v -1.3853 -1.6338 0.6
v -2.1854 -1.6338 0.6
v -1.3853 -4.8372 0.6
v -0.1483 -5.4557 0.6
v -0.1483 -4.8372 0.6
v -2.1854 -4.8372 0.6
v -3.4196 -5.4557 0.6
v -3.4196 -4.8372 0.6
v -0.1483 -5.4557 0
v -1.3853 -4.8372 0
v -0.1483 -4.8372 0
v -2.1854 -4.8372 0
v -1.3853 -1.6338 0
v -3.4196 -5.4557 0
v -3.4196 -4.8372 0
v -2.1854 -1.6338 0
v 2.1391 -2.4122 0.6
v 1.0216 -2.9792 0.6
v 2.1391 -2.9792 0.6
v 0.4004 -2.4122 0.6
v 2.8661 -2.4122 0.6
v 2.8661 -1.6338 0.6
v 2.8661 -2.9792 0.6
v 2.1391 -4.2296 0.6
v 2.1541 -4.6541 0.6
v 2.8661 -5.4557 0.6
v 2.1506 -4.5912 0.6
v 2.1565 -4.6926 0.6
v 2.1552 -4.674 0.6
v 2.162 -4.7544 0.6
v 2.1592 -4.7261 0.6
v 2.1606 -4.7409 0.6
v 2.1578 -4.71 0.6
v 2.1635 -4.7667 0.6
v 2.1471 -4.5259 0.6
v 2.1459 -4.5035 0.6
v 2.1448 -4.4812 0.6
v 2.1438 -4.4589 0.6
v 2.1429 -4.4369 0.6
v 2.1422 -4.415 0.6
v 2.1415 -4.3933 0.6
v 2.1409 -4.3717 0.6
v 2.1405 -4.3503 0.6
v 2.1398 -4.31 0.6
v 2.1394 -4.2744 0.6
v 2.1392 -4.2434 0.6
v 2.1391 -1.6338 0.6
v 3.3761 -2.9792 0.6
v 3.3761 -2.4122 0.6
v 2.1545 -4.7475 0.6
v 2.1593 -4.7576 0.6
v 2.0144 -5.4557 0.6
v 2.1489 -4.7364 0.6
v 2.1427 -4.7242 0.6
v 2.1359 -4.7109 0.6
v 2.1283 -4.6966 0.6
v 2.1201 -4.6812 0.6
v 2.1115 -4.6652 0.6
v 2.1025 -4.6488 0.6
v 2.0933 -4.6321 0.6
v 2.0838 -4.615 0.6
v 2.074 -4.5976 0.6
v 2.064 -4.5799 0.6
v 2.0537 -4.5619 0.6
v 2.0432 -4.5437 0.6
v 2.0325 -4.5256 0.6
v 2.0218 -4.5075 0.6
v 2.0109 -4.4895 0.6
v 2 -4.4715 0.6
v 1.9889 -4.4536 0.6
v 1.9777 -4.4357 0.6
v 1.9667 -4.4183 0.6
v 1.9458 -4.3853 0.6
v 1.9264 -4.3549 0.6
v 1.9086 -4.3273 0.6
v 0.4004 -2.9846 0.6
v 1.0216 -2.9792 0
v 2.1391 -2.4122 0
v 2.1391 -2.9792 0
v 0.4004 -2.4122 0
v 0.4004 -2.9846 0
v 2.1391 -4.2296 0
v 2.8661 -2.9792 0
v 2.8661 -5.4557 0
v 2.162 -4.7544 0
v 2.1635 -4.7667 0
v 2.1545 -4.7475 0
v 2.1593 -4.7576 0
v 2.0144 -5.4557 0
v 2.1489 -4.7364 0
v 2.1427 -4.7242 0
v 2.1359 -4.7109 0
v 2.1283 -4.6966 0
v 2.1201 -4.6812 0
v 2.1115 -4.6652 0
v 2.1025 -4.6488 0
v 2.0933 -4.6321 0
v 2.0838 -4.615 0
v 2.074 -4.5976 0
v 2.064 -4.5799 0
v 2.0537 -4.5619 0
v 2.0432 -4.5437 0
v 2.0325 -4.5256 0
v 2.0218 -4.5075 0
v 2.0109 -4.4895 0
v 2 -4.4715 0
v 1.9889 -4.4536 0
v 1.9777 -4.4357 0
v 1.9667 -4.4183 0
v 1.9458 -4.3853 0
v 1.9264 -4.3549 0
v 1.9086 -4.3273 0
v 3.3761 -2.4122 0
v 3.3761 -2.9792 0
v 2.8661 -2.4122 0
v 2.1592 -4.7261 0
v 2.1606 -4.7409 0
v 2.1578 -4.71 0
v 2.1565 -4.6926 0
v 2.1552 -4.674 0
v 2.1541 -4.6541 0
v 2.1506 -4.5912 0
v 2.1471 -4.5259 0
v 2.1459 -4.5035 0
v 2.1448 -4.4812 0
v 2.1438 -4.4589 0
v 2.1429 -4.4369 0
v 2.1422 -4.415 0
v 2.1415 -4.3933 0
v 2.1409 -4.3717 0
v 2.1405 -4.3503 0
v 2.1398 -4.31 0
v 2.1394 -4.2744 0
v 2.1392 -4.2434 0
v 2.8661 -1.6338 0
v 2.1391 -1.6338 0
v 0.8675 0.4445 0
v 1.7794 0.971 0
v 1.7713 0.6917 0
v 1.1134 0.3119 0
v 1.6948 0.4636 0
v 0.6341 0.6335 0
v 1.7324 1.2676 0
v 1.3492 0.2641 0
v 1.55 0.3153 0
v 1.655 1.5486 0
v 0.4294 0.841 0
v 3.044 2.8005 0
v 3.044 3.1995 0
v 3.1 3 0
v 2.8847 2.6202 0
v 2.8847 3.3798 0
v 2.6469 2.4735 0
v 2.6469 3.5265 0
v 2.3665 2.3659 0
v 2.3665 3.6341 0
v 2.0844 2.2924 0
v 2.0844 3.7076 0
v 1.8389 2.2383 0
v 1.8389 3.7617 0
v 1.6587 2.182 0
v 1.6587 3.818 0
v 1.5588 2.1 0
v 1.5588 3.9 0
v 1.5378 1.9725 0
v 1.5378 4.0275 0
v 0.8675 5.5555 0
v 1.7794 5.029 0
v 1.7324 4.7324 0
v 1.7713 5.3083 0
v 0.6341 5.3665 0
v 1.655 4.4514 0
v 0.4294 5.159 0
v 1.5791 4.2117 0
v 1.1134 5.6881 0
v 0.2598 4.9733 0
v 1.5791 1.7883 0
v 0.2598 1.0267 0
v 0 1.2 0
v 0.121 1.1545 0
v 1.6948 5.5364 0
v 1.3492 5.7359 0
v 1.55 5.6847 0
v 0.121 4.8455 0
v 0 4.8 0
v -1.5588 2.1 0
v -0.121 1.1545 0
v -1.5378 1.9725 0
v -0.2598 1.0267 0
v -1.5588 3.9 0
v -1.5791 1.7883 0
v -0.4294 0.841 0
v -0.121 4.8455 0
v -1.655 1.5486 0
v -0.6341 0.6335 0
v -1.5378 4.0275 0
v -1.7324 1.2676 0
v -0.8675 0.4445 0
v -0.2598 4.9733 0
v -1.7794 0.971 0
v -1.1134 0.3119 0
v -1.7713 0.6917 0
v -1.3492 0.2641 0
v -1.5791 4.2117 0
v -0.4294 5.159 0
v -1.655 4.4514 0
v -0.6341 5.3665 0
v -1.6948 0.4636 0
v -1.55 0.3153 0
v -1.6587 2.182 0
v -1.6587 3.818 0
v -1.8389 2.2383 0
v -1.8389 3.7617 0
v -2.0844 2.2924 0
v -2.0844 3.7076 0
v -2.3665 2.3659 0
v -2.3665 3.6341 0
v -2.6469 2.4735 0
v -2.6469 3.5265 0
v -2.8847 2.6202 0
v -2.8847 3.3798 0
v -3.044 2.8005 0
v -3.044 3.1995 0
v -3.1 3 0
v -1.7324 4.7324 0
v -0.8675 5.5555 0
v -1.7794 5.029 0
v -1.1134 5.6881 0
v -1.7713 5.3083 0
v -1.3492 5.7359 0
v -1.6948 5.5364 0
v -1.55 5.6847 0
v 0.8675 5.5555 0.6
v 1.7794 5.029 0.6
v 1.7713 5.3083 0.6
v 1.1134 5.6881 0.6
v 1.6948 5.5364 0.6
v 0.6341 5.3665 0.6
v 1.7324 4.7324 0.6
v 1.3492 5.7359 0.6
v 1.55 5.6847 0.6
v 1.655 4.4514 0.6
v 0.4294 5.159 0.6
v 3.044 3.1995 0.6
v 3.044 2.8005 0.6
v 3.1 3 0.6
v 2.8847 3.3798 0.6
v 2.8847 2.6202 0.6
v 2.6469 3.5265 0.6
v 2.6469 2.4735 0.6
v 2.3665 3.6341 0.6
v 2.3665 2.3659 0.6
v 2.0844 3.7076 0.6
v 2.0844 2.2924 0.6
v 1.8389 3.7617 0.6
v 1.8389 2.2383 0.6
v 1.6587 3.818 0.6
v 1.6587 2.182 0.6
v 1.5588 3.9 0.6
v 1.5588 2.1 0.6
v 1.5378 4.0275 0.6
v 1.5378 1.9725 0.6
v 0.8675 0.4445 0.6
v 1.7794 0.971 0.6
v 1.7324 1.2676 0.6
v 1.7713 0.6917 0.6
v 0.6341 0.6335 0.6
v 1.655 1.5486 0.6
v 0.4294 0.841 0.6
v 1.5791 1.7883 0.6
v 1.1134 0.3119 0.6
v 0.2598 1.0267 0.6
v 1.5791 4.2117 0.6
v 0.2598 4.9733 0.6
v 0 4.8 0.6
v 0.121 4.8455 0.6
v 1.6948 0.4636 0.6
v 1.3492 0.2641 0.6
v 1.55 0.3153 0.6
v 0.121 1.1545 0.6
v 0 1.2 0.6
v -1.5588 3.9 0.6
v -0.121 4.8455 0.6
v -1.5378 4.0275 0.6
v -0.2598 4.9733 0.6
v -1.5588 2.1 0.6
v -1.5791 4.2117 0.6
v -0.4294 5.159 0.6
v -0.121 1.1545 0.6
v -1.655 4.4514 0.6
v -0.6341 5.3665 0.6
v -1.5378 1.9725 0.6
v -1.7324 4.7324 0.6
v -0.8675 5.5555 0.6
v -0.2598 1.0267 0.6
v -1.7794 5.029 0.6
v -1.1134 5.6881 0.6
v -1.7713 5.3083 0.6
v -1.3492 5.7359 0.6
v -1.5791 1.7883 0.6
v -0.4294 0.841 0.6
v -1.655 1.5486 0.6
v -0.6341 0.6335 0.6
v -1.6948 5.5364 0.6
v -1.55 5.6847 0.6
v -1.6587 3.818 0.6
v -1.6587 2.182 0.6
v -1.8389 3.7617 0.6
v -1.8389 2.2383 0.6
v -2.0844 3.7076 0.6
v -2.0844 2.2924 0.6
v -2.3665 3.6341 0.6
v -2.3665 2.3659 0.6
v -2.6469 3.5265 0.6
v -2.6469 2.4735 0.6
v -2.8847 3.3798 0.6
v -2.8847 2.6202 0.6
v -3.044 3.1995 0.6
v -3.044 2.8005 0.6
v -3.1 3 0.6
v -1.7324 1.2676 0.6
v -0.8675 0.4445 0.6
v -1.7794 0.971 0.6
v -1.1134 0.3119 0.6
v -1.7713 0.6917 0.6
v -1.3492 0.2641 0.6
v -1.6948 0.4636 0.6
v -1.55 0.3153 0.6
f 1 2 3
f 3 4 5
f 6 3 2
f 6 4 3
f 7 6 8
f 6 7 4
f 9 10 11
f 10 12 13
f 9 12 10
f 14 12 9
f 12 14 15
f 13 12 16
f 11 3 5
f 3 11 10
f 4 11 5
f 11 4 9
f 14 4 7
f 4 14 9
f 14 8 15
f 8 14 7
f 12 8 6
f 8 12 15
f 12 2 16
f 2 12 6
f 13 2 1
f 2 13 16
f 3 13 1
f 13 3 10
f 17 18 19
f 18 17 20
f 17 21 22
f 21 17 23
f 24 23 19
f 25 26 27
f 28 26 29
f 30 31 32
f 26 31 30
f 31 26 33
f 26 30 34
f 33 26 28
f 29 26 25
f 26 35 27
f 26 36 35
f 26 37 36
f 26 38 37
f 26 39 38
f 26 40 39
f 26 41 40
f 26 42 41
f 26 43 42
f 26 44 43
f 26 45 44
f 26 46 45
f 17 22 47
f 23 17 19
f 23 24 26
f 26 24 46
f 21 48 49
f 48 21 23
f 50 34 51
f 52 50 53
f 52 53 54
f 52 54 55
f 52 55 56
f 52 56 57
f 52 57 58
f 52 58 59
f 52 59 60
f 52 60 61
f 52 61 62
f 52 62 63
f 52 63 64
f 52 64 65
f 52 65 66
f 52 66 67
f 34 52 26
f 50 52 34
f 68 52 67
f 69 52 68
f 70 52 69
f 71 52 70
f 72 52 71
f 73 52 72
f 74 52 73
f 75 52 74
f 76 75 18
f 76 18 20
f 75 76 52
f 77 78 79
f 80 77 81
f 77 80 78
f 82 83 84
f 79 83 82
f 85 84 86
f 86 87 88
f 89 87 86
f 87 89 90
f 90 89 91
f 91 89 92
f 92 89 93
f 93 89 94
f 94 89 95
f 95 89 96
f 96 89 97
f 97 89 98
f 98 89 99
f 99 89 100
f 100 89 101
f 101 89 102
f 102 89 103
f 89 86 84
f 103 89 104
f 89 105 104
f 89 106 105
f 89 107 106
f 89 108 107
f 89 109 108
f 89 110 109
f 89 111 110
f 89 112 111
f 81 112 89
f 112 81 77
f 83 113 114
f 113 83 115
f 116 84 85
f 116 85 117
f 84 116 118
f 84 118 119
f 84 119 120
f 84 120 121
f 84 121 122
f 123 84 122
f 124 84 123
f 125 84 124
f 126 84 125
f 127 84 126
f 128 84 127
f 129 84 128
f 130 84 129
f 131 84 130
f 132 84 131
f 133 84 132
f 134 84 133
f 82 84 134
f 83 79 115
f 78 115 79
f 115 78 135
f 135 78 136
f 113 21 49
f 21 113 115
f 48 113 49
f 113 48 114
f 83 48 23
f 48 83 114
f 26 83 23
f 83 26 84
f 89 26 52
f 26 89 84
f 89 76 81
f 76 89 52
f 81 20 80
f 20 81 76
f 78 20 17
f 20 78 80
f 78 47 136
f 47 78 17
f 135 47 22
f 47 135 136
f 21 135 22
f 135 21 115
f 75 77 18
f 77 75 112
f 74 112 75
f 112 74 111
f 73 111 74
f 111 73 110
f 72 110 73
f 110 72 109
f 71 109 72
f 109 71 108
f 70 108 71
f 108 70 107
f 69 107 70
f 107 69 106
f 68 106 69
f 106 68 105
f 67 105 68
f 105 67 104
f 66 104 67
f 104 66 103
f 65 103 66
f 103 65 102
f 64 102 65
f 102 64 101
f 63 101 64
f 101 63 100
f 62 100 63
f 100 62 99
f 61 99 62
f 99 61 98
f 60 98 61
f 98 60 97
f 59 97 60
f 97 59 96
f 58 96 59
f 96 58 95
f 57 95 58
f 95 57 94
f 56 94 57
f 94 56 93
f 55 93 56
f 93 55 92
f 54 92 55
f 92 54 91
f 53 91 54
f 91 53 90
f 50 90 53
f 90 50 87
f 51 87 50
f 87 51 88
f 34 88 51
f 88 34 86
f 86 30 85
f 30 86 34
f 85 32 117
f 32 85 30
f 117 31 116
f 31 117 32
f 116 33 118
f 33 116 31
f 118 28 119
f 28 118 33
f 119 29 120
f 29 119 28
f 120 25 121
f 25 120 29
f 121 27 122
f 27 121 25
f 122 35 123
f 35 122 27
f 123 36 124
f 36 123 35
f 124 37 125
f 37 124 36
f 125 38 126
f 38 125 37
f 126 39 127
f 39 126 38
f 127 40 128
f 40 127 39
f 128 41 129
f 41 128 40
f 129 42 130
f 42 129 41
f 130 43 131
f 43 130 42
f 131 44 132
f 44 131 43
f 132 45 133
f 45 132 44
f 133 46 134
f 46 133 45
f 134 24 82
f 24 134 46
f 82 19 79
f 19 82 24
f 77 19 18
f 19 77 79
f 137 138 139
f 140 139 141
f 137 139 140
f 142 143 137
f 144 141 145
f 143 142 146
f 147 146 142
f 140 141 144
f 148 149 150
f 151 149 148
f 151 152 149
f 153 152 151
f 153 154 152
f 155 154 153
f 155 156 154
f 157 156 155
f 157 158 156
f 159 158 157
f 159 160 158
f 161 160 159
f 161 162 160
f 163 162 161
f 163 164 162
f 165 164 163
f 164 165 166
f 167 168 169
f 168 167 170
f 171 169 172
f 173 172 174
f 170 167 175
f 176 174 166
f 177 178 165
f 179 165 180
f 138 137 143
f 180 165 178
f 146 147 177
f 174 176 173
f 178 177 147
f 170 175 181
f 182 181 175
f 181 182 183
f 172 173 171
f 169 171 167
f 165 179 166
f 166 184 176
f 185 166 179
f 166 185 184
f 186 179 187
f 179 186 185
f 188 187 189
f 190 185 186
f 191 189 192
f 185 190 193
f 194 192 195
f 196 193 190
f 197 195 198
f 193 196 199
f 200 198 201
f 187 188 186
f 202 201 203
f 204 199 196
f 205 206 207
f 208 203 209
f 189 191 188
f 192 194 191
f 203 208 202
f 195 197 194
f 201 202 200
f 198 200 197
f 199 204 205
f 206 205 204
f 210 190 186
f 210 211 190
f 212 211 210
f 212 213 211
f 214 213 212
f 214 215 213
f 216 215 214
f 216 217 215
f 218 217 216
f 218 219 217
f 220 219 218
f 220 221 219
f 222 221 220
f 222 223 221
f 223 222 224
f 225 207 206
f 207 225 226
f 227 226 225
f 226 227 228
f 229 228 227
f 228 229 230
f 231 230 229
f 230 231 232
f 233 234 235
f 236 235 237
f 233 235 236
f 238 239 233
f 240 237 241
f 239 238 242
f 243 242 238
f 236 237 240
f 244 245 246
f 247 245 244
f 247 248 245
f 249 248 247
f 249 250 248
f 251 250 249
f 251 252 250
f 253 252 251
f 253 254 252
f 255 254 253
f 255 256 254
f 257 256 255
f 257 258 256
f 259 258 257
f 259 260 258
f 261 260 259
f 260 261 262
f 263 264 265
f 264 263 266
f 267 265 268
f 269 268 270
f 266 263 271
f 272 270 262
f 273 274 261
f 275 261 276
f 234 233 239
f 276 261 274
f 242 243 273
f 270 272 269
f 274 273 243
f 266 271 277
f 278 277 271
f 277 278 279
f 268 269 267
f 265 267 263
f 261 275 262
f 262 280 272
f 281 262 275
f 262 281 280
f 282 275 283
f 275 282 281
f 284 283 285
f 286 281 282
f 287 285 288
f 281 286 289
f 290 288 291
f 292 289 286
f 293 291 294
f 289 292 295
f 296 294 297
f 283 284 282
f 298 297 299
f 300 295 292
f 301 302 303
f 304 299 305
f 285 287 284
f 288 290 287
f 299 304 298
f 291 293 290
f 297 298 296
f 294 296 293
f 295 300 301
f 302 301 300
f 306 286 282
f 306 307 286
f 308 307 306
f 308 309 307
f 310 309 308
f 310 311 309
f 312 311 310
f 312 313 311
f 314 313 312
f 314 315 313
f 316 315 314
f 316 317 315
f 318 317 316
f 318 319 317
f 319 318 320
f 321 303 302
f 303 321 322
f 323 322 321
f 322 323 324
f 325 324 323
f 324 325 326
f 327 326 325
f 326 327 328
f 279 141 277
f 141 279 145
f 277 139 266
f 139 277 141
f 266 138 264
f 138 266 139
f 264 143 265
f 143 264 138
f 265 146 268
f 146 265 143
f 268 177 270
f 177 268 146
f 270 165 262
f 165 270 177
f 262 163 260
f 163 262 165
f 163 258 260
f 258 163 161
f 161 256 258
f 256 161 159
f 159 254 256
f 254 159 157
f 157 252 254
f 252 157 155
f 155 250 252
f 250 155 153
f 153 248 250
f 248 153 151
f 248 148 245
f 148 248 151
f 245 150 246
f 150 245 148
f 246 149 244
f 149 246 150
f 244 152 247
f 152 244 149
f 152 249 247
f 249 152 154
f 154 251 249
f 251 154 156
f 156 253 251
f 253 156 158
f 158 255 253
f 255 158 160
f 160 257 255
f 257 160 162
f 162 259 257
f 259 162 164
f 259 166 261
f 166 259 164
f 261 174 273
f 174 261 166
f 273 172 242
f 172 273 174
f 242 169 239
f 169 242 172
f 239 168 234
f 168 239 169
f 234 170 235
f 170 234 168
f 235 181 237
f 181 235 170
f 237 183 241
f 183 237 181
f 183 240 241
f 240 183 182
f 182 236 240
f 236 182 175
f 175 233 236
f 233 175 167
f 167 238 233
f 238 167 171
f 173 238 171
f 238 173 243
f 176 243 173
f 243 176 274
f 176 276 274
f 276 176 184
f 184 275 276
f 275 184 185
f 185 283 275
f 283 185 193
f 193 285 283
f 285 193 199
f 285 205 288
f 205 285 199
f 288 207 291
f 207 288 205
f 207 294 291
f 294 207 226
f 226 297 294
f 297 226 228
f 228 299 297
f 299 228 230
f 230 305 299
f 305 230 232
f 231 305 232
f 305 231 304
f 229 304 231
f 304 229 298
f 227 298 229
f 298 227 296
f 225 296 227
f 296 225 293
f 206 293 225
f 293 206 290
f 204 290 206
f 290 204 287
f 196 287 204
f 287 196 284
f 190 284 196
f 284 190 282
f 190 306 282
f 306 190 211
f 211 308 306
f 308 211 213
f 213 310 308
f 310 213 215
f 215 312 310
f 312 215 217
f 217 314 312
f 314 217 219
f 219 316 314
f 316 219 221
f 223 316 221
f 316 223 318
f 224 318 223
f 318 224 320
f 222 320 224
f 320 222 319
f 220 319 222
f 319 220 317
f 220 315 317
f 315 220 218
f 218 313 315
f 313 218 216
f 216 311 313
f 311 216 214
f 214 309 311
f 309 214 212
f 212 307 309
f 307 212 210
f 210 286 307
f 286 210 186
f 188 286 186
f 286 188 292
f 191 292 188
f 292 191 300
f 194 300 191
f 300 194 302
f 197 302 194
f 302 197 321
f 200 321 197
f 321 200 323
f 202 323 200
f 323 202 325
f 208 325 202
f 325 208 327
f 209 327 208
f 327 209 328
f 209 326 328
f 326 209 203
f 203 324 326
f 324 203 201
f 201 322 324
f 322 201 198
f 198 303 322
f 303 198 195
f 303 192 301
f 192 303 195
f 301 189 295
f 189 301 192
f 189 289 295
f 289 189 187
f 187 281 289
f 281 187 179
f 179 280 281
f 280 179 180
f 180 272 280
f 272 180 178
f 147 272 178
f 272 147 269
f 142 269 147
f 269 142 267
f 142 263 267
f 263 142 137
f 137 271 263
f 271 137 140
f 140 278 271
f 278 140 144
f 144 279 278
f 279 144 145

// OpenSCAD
$fn = 50;

difference() {
	union() {
		translate(v = [-1.825, -3.5, 0.6]) {
			rotate(a = [180, 0, 0]) {
				linear_extrude(height = 0.6) {
					text(font = "Liberation Sans:style=Bold", halign = "center", size = 4.0, text = "T", valign = "center");
				}
			}
		}
		translate(v = [1.825, -3.5, 0.6]) {
			rotate(a = [180, 0, 0]) {
				linear_extrude(height = 0.6) {
					text(font = "Liberation Sans:style=Bold", halign = "center", size = 4.0, text = "4", valign = "center");
				}
			}
		}
		translate(v = [0, 3, 0]) {
			linear_extrude(height = 0.6) {
				polygon(points = [[3.1, 0.0], [3.0439902950186117, 0.1995136647114984], [2.8847272103883213, 0.3797815421059436], [2.646888617374527, 0.5264988810722369], [2.3665182744082176, 0.6341066605011758], [2.0844354103556904, 0.7075704773708675], [1.8388718910678303, 0.761685676746956], [1.658746676795018, 0.818003336606089], [1.55884572681199, 0.9], [1.5377850082788151, 1.0275150922444565], [1.5790750912955211, 1.211666933596394], [1.6549917135488983, 1.4513887792304347], [1.7324116139070416, 1.7324116139070416], [1.779405714759903, 2.0290233430980913], [1.7712640685463372, 2.3083562761315313], [1.6947790495515949, 2.5364160920036563], [1.5500000000000005, 2.68467875173176], [1.3492112454670173, 2.735929756715155], [1.1134631418419842, 2.688137818237475], [0.8674829026146248, 2.555522224170328], [0.6341066605011758, 2.3665182744082176], [0.42944369680679173, 2.1589592566013023], [0.2597967997723095, 1.9733526103433505], [0.120961668516203, 1.8455184288505457], [1.102182119232618e-16, 1.8000000000000003], [-0.12096166851620277, 1.8455184288505457], [-0.25979679977230924, 1.9733526103433503], [-0.42944369680679134, 2.158959256601302], [-0.6341066605011755, 2.366518274408217], [-0.8674829026146244, 2.555522224170328], [-1.1134631418419831, 2.688137818237475], [-1.3492112454670169, 2.735929756715155], [-1.5499999999999994, 2.68467875173176], [-1.6947790495515944, 2.536416092003656], [-1.7712640685463372, 2.3083562761315313], [-1.7794057147599032, 2.0290233430980913], [-1.7324116139070418, 1.732411613907042], [-1.6549917135488983, 1.4513887792304352], [-1.5790750912955214, 1.211666933596395], [-1.5377850082788156, 1.0275150922444576], [-1.55884572681199, 0.9], [-1.6587466767950174, 0.8180033366060897], [-1.8388718910678303, 0.7616856767469562], [-2.084435410355689, 0.7075704773708675], [-2.3665182744082154, 0.634106660501176], [-2.646888617374527, 0.5264988810722366], [-2.8847272103883204, 0.37978154210594467], [-3.0439902950186117, 0.1995136647114986], [-3.1, 3.796405077356795e-16], [-3.043990295018612, -0.19951366471149784], [-2.8847272103883213, -0.37978154210594417], [-2.646888617374528, -0.5264988810722362], [-2.366518274408217, -0.6341066605011759], [-2.0844354103556904, -0.7075704773708673], [-1.8388718910678312, -0.7616856767469561], [-1.6587466767950179, -0.8180033366060894], [-1.5588457268119902, -0.8999999999999996], [-1.5377850082788154, -1.0275150922444558], [-1.5790750912955211, -1.211666933596394], [-1.6549917135488978, -1.4513887792304343], [-1.7324116139070413, -1.7324116139070393], [-1.7794057147599032, -2.0290233430980904], [-1.7712640685463374, -2.30835627613153], [-1.6947790495515942, -2.5364160920036567], [-1.5500000000000014, -2.6846787517317594], [-1.349211245467018, -2.7359297567151555], [-1.1134631418419827, -2.688137818237474], [-0.8674829026146252, -2.5555222241703284], [-0.6341066605011755, -2.366518274408217], [-0.42944369680679256, -2.1589592566013027], [-0.2597967997723094, -1.973352610343351], [-0.12096166851620195, -1.8455184288505448], [-3.3065463576978537e-16, -1.8000000000000003], [0.12096166851620122, -1.8455184288505442], [0.2597967997723086, -1.9733526103433503], [0.4294436968067915, -2.1589592566013014], [0.6341066605011743, -2.3665182744082163], [0.8674829026146239, -2.5555222241703275], [1.1134631418419814, -2.688137818237473], [1.3492112454670167, -2.735929756715155], [1.5500000000000005, -2.68467875173176], [1.6947790495515938, -2.536416092003658], [1.7712640685463361, -2.3083562761315344], [1.7794057147599027, -2.0290233430980895], [1.732411613907041, -1.7324116139070416], [1.6549917135488992, -1.451388779230435], [1.5790750912955214, -1.2116669335963952], [1.5377850082788151, -1.0275150922444585], [1.5588457268119893, -0.9000000000000009], [1.658746676795018, -0.8180033366060894], [1.8388718910678303, -0.7616856767469555], [2.084435410355689, -0.7075704773708676], [2.366518274408215, -0.6341066605011774], [2.646888617374524, -0.5264988810722376], [2.8847272103883217, -0.37978154210594395], [3.0439902950186117, -0.1995136647114976]]);
			}
		}
	}
	union();
}
